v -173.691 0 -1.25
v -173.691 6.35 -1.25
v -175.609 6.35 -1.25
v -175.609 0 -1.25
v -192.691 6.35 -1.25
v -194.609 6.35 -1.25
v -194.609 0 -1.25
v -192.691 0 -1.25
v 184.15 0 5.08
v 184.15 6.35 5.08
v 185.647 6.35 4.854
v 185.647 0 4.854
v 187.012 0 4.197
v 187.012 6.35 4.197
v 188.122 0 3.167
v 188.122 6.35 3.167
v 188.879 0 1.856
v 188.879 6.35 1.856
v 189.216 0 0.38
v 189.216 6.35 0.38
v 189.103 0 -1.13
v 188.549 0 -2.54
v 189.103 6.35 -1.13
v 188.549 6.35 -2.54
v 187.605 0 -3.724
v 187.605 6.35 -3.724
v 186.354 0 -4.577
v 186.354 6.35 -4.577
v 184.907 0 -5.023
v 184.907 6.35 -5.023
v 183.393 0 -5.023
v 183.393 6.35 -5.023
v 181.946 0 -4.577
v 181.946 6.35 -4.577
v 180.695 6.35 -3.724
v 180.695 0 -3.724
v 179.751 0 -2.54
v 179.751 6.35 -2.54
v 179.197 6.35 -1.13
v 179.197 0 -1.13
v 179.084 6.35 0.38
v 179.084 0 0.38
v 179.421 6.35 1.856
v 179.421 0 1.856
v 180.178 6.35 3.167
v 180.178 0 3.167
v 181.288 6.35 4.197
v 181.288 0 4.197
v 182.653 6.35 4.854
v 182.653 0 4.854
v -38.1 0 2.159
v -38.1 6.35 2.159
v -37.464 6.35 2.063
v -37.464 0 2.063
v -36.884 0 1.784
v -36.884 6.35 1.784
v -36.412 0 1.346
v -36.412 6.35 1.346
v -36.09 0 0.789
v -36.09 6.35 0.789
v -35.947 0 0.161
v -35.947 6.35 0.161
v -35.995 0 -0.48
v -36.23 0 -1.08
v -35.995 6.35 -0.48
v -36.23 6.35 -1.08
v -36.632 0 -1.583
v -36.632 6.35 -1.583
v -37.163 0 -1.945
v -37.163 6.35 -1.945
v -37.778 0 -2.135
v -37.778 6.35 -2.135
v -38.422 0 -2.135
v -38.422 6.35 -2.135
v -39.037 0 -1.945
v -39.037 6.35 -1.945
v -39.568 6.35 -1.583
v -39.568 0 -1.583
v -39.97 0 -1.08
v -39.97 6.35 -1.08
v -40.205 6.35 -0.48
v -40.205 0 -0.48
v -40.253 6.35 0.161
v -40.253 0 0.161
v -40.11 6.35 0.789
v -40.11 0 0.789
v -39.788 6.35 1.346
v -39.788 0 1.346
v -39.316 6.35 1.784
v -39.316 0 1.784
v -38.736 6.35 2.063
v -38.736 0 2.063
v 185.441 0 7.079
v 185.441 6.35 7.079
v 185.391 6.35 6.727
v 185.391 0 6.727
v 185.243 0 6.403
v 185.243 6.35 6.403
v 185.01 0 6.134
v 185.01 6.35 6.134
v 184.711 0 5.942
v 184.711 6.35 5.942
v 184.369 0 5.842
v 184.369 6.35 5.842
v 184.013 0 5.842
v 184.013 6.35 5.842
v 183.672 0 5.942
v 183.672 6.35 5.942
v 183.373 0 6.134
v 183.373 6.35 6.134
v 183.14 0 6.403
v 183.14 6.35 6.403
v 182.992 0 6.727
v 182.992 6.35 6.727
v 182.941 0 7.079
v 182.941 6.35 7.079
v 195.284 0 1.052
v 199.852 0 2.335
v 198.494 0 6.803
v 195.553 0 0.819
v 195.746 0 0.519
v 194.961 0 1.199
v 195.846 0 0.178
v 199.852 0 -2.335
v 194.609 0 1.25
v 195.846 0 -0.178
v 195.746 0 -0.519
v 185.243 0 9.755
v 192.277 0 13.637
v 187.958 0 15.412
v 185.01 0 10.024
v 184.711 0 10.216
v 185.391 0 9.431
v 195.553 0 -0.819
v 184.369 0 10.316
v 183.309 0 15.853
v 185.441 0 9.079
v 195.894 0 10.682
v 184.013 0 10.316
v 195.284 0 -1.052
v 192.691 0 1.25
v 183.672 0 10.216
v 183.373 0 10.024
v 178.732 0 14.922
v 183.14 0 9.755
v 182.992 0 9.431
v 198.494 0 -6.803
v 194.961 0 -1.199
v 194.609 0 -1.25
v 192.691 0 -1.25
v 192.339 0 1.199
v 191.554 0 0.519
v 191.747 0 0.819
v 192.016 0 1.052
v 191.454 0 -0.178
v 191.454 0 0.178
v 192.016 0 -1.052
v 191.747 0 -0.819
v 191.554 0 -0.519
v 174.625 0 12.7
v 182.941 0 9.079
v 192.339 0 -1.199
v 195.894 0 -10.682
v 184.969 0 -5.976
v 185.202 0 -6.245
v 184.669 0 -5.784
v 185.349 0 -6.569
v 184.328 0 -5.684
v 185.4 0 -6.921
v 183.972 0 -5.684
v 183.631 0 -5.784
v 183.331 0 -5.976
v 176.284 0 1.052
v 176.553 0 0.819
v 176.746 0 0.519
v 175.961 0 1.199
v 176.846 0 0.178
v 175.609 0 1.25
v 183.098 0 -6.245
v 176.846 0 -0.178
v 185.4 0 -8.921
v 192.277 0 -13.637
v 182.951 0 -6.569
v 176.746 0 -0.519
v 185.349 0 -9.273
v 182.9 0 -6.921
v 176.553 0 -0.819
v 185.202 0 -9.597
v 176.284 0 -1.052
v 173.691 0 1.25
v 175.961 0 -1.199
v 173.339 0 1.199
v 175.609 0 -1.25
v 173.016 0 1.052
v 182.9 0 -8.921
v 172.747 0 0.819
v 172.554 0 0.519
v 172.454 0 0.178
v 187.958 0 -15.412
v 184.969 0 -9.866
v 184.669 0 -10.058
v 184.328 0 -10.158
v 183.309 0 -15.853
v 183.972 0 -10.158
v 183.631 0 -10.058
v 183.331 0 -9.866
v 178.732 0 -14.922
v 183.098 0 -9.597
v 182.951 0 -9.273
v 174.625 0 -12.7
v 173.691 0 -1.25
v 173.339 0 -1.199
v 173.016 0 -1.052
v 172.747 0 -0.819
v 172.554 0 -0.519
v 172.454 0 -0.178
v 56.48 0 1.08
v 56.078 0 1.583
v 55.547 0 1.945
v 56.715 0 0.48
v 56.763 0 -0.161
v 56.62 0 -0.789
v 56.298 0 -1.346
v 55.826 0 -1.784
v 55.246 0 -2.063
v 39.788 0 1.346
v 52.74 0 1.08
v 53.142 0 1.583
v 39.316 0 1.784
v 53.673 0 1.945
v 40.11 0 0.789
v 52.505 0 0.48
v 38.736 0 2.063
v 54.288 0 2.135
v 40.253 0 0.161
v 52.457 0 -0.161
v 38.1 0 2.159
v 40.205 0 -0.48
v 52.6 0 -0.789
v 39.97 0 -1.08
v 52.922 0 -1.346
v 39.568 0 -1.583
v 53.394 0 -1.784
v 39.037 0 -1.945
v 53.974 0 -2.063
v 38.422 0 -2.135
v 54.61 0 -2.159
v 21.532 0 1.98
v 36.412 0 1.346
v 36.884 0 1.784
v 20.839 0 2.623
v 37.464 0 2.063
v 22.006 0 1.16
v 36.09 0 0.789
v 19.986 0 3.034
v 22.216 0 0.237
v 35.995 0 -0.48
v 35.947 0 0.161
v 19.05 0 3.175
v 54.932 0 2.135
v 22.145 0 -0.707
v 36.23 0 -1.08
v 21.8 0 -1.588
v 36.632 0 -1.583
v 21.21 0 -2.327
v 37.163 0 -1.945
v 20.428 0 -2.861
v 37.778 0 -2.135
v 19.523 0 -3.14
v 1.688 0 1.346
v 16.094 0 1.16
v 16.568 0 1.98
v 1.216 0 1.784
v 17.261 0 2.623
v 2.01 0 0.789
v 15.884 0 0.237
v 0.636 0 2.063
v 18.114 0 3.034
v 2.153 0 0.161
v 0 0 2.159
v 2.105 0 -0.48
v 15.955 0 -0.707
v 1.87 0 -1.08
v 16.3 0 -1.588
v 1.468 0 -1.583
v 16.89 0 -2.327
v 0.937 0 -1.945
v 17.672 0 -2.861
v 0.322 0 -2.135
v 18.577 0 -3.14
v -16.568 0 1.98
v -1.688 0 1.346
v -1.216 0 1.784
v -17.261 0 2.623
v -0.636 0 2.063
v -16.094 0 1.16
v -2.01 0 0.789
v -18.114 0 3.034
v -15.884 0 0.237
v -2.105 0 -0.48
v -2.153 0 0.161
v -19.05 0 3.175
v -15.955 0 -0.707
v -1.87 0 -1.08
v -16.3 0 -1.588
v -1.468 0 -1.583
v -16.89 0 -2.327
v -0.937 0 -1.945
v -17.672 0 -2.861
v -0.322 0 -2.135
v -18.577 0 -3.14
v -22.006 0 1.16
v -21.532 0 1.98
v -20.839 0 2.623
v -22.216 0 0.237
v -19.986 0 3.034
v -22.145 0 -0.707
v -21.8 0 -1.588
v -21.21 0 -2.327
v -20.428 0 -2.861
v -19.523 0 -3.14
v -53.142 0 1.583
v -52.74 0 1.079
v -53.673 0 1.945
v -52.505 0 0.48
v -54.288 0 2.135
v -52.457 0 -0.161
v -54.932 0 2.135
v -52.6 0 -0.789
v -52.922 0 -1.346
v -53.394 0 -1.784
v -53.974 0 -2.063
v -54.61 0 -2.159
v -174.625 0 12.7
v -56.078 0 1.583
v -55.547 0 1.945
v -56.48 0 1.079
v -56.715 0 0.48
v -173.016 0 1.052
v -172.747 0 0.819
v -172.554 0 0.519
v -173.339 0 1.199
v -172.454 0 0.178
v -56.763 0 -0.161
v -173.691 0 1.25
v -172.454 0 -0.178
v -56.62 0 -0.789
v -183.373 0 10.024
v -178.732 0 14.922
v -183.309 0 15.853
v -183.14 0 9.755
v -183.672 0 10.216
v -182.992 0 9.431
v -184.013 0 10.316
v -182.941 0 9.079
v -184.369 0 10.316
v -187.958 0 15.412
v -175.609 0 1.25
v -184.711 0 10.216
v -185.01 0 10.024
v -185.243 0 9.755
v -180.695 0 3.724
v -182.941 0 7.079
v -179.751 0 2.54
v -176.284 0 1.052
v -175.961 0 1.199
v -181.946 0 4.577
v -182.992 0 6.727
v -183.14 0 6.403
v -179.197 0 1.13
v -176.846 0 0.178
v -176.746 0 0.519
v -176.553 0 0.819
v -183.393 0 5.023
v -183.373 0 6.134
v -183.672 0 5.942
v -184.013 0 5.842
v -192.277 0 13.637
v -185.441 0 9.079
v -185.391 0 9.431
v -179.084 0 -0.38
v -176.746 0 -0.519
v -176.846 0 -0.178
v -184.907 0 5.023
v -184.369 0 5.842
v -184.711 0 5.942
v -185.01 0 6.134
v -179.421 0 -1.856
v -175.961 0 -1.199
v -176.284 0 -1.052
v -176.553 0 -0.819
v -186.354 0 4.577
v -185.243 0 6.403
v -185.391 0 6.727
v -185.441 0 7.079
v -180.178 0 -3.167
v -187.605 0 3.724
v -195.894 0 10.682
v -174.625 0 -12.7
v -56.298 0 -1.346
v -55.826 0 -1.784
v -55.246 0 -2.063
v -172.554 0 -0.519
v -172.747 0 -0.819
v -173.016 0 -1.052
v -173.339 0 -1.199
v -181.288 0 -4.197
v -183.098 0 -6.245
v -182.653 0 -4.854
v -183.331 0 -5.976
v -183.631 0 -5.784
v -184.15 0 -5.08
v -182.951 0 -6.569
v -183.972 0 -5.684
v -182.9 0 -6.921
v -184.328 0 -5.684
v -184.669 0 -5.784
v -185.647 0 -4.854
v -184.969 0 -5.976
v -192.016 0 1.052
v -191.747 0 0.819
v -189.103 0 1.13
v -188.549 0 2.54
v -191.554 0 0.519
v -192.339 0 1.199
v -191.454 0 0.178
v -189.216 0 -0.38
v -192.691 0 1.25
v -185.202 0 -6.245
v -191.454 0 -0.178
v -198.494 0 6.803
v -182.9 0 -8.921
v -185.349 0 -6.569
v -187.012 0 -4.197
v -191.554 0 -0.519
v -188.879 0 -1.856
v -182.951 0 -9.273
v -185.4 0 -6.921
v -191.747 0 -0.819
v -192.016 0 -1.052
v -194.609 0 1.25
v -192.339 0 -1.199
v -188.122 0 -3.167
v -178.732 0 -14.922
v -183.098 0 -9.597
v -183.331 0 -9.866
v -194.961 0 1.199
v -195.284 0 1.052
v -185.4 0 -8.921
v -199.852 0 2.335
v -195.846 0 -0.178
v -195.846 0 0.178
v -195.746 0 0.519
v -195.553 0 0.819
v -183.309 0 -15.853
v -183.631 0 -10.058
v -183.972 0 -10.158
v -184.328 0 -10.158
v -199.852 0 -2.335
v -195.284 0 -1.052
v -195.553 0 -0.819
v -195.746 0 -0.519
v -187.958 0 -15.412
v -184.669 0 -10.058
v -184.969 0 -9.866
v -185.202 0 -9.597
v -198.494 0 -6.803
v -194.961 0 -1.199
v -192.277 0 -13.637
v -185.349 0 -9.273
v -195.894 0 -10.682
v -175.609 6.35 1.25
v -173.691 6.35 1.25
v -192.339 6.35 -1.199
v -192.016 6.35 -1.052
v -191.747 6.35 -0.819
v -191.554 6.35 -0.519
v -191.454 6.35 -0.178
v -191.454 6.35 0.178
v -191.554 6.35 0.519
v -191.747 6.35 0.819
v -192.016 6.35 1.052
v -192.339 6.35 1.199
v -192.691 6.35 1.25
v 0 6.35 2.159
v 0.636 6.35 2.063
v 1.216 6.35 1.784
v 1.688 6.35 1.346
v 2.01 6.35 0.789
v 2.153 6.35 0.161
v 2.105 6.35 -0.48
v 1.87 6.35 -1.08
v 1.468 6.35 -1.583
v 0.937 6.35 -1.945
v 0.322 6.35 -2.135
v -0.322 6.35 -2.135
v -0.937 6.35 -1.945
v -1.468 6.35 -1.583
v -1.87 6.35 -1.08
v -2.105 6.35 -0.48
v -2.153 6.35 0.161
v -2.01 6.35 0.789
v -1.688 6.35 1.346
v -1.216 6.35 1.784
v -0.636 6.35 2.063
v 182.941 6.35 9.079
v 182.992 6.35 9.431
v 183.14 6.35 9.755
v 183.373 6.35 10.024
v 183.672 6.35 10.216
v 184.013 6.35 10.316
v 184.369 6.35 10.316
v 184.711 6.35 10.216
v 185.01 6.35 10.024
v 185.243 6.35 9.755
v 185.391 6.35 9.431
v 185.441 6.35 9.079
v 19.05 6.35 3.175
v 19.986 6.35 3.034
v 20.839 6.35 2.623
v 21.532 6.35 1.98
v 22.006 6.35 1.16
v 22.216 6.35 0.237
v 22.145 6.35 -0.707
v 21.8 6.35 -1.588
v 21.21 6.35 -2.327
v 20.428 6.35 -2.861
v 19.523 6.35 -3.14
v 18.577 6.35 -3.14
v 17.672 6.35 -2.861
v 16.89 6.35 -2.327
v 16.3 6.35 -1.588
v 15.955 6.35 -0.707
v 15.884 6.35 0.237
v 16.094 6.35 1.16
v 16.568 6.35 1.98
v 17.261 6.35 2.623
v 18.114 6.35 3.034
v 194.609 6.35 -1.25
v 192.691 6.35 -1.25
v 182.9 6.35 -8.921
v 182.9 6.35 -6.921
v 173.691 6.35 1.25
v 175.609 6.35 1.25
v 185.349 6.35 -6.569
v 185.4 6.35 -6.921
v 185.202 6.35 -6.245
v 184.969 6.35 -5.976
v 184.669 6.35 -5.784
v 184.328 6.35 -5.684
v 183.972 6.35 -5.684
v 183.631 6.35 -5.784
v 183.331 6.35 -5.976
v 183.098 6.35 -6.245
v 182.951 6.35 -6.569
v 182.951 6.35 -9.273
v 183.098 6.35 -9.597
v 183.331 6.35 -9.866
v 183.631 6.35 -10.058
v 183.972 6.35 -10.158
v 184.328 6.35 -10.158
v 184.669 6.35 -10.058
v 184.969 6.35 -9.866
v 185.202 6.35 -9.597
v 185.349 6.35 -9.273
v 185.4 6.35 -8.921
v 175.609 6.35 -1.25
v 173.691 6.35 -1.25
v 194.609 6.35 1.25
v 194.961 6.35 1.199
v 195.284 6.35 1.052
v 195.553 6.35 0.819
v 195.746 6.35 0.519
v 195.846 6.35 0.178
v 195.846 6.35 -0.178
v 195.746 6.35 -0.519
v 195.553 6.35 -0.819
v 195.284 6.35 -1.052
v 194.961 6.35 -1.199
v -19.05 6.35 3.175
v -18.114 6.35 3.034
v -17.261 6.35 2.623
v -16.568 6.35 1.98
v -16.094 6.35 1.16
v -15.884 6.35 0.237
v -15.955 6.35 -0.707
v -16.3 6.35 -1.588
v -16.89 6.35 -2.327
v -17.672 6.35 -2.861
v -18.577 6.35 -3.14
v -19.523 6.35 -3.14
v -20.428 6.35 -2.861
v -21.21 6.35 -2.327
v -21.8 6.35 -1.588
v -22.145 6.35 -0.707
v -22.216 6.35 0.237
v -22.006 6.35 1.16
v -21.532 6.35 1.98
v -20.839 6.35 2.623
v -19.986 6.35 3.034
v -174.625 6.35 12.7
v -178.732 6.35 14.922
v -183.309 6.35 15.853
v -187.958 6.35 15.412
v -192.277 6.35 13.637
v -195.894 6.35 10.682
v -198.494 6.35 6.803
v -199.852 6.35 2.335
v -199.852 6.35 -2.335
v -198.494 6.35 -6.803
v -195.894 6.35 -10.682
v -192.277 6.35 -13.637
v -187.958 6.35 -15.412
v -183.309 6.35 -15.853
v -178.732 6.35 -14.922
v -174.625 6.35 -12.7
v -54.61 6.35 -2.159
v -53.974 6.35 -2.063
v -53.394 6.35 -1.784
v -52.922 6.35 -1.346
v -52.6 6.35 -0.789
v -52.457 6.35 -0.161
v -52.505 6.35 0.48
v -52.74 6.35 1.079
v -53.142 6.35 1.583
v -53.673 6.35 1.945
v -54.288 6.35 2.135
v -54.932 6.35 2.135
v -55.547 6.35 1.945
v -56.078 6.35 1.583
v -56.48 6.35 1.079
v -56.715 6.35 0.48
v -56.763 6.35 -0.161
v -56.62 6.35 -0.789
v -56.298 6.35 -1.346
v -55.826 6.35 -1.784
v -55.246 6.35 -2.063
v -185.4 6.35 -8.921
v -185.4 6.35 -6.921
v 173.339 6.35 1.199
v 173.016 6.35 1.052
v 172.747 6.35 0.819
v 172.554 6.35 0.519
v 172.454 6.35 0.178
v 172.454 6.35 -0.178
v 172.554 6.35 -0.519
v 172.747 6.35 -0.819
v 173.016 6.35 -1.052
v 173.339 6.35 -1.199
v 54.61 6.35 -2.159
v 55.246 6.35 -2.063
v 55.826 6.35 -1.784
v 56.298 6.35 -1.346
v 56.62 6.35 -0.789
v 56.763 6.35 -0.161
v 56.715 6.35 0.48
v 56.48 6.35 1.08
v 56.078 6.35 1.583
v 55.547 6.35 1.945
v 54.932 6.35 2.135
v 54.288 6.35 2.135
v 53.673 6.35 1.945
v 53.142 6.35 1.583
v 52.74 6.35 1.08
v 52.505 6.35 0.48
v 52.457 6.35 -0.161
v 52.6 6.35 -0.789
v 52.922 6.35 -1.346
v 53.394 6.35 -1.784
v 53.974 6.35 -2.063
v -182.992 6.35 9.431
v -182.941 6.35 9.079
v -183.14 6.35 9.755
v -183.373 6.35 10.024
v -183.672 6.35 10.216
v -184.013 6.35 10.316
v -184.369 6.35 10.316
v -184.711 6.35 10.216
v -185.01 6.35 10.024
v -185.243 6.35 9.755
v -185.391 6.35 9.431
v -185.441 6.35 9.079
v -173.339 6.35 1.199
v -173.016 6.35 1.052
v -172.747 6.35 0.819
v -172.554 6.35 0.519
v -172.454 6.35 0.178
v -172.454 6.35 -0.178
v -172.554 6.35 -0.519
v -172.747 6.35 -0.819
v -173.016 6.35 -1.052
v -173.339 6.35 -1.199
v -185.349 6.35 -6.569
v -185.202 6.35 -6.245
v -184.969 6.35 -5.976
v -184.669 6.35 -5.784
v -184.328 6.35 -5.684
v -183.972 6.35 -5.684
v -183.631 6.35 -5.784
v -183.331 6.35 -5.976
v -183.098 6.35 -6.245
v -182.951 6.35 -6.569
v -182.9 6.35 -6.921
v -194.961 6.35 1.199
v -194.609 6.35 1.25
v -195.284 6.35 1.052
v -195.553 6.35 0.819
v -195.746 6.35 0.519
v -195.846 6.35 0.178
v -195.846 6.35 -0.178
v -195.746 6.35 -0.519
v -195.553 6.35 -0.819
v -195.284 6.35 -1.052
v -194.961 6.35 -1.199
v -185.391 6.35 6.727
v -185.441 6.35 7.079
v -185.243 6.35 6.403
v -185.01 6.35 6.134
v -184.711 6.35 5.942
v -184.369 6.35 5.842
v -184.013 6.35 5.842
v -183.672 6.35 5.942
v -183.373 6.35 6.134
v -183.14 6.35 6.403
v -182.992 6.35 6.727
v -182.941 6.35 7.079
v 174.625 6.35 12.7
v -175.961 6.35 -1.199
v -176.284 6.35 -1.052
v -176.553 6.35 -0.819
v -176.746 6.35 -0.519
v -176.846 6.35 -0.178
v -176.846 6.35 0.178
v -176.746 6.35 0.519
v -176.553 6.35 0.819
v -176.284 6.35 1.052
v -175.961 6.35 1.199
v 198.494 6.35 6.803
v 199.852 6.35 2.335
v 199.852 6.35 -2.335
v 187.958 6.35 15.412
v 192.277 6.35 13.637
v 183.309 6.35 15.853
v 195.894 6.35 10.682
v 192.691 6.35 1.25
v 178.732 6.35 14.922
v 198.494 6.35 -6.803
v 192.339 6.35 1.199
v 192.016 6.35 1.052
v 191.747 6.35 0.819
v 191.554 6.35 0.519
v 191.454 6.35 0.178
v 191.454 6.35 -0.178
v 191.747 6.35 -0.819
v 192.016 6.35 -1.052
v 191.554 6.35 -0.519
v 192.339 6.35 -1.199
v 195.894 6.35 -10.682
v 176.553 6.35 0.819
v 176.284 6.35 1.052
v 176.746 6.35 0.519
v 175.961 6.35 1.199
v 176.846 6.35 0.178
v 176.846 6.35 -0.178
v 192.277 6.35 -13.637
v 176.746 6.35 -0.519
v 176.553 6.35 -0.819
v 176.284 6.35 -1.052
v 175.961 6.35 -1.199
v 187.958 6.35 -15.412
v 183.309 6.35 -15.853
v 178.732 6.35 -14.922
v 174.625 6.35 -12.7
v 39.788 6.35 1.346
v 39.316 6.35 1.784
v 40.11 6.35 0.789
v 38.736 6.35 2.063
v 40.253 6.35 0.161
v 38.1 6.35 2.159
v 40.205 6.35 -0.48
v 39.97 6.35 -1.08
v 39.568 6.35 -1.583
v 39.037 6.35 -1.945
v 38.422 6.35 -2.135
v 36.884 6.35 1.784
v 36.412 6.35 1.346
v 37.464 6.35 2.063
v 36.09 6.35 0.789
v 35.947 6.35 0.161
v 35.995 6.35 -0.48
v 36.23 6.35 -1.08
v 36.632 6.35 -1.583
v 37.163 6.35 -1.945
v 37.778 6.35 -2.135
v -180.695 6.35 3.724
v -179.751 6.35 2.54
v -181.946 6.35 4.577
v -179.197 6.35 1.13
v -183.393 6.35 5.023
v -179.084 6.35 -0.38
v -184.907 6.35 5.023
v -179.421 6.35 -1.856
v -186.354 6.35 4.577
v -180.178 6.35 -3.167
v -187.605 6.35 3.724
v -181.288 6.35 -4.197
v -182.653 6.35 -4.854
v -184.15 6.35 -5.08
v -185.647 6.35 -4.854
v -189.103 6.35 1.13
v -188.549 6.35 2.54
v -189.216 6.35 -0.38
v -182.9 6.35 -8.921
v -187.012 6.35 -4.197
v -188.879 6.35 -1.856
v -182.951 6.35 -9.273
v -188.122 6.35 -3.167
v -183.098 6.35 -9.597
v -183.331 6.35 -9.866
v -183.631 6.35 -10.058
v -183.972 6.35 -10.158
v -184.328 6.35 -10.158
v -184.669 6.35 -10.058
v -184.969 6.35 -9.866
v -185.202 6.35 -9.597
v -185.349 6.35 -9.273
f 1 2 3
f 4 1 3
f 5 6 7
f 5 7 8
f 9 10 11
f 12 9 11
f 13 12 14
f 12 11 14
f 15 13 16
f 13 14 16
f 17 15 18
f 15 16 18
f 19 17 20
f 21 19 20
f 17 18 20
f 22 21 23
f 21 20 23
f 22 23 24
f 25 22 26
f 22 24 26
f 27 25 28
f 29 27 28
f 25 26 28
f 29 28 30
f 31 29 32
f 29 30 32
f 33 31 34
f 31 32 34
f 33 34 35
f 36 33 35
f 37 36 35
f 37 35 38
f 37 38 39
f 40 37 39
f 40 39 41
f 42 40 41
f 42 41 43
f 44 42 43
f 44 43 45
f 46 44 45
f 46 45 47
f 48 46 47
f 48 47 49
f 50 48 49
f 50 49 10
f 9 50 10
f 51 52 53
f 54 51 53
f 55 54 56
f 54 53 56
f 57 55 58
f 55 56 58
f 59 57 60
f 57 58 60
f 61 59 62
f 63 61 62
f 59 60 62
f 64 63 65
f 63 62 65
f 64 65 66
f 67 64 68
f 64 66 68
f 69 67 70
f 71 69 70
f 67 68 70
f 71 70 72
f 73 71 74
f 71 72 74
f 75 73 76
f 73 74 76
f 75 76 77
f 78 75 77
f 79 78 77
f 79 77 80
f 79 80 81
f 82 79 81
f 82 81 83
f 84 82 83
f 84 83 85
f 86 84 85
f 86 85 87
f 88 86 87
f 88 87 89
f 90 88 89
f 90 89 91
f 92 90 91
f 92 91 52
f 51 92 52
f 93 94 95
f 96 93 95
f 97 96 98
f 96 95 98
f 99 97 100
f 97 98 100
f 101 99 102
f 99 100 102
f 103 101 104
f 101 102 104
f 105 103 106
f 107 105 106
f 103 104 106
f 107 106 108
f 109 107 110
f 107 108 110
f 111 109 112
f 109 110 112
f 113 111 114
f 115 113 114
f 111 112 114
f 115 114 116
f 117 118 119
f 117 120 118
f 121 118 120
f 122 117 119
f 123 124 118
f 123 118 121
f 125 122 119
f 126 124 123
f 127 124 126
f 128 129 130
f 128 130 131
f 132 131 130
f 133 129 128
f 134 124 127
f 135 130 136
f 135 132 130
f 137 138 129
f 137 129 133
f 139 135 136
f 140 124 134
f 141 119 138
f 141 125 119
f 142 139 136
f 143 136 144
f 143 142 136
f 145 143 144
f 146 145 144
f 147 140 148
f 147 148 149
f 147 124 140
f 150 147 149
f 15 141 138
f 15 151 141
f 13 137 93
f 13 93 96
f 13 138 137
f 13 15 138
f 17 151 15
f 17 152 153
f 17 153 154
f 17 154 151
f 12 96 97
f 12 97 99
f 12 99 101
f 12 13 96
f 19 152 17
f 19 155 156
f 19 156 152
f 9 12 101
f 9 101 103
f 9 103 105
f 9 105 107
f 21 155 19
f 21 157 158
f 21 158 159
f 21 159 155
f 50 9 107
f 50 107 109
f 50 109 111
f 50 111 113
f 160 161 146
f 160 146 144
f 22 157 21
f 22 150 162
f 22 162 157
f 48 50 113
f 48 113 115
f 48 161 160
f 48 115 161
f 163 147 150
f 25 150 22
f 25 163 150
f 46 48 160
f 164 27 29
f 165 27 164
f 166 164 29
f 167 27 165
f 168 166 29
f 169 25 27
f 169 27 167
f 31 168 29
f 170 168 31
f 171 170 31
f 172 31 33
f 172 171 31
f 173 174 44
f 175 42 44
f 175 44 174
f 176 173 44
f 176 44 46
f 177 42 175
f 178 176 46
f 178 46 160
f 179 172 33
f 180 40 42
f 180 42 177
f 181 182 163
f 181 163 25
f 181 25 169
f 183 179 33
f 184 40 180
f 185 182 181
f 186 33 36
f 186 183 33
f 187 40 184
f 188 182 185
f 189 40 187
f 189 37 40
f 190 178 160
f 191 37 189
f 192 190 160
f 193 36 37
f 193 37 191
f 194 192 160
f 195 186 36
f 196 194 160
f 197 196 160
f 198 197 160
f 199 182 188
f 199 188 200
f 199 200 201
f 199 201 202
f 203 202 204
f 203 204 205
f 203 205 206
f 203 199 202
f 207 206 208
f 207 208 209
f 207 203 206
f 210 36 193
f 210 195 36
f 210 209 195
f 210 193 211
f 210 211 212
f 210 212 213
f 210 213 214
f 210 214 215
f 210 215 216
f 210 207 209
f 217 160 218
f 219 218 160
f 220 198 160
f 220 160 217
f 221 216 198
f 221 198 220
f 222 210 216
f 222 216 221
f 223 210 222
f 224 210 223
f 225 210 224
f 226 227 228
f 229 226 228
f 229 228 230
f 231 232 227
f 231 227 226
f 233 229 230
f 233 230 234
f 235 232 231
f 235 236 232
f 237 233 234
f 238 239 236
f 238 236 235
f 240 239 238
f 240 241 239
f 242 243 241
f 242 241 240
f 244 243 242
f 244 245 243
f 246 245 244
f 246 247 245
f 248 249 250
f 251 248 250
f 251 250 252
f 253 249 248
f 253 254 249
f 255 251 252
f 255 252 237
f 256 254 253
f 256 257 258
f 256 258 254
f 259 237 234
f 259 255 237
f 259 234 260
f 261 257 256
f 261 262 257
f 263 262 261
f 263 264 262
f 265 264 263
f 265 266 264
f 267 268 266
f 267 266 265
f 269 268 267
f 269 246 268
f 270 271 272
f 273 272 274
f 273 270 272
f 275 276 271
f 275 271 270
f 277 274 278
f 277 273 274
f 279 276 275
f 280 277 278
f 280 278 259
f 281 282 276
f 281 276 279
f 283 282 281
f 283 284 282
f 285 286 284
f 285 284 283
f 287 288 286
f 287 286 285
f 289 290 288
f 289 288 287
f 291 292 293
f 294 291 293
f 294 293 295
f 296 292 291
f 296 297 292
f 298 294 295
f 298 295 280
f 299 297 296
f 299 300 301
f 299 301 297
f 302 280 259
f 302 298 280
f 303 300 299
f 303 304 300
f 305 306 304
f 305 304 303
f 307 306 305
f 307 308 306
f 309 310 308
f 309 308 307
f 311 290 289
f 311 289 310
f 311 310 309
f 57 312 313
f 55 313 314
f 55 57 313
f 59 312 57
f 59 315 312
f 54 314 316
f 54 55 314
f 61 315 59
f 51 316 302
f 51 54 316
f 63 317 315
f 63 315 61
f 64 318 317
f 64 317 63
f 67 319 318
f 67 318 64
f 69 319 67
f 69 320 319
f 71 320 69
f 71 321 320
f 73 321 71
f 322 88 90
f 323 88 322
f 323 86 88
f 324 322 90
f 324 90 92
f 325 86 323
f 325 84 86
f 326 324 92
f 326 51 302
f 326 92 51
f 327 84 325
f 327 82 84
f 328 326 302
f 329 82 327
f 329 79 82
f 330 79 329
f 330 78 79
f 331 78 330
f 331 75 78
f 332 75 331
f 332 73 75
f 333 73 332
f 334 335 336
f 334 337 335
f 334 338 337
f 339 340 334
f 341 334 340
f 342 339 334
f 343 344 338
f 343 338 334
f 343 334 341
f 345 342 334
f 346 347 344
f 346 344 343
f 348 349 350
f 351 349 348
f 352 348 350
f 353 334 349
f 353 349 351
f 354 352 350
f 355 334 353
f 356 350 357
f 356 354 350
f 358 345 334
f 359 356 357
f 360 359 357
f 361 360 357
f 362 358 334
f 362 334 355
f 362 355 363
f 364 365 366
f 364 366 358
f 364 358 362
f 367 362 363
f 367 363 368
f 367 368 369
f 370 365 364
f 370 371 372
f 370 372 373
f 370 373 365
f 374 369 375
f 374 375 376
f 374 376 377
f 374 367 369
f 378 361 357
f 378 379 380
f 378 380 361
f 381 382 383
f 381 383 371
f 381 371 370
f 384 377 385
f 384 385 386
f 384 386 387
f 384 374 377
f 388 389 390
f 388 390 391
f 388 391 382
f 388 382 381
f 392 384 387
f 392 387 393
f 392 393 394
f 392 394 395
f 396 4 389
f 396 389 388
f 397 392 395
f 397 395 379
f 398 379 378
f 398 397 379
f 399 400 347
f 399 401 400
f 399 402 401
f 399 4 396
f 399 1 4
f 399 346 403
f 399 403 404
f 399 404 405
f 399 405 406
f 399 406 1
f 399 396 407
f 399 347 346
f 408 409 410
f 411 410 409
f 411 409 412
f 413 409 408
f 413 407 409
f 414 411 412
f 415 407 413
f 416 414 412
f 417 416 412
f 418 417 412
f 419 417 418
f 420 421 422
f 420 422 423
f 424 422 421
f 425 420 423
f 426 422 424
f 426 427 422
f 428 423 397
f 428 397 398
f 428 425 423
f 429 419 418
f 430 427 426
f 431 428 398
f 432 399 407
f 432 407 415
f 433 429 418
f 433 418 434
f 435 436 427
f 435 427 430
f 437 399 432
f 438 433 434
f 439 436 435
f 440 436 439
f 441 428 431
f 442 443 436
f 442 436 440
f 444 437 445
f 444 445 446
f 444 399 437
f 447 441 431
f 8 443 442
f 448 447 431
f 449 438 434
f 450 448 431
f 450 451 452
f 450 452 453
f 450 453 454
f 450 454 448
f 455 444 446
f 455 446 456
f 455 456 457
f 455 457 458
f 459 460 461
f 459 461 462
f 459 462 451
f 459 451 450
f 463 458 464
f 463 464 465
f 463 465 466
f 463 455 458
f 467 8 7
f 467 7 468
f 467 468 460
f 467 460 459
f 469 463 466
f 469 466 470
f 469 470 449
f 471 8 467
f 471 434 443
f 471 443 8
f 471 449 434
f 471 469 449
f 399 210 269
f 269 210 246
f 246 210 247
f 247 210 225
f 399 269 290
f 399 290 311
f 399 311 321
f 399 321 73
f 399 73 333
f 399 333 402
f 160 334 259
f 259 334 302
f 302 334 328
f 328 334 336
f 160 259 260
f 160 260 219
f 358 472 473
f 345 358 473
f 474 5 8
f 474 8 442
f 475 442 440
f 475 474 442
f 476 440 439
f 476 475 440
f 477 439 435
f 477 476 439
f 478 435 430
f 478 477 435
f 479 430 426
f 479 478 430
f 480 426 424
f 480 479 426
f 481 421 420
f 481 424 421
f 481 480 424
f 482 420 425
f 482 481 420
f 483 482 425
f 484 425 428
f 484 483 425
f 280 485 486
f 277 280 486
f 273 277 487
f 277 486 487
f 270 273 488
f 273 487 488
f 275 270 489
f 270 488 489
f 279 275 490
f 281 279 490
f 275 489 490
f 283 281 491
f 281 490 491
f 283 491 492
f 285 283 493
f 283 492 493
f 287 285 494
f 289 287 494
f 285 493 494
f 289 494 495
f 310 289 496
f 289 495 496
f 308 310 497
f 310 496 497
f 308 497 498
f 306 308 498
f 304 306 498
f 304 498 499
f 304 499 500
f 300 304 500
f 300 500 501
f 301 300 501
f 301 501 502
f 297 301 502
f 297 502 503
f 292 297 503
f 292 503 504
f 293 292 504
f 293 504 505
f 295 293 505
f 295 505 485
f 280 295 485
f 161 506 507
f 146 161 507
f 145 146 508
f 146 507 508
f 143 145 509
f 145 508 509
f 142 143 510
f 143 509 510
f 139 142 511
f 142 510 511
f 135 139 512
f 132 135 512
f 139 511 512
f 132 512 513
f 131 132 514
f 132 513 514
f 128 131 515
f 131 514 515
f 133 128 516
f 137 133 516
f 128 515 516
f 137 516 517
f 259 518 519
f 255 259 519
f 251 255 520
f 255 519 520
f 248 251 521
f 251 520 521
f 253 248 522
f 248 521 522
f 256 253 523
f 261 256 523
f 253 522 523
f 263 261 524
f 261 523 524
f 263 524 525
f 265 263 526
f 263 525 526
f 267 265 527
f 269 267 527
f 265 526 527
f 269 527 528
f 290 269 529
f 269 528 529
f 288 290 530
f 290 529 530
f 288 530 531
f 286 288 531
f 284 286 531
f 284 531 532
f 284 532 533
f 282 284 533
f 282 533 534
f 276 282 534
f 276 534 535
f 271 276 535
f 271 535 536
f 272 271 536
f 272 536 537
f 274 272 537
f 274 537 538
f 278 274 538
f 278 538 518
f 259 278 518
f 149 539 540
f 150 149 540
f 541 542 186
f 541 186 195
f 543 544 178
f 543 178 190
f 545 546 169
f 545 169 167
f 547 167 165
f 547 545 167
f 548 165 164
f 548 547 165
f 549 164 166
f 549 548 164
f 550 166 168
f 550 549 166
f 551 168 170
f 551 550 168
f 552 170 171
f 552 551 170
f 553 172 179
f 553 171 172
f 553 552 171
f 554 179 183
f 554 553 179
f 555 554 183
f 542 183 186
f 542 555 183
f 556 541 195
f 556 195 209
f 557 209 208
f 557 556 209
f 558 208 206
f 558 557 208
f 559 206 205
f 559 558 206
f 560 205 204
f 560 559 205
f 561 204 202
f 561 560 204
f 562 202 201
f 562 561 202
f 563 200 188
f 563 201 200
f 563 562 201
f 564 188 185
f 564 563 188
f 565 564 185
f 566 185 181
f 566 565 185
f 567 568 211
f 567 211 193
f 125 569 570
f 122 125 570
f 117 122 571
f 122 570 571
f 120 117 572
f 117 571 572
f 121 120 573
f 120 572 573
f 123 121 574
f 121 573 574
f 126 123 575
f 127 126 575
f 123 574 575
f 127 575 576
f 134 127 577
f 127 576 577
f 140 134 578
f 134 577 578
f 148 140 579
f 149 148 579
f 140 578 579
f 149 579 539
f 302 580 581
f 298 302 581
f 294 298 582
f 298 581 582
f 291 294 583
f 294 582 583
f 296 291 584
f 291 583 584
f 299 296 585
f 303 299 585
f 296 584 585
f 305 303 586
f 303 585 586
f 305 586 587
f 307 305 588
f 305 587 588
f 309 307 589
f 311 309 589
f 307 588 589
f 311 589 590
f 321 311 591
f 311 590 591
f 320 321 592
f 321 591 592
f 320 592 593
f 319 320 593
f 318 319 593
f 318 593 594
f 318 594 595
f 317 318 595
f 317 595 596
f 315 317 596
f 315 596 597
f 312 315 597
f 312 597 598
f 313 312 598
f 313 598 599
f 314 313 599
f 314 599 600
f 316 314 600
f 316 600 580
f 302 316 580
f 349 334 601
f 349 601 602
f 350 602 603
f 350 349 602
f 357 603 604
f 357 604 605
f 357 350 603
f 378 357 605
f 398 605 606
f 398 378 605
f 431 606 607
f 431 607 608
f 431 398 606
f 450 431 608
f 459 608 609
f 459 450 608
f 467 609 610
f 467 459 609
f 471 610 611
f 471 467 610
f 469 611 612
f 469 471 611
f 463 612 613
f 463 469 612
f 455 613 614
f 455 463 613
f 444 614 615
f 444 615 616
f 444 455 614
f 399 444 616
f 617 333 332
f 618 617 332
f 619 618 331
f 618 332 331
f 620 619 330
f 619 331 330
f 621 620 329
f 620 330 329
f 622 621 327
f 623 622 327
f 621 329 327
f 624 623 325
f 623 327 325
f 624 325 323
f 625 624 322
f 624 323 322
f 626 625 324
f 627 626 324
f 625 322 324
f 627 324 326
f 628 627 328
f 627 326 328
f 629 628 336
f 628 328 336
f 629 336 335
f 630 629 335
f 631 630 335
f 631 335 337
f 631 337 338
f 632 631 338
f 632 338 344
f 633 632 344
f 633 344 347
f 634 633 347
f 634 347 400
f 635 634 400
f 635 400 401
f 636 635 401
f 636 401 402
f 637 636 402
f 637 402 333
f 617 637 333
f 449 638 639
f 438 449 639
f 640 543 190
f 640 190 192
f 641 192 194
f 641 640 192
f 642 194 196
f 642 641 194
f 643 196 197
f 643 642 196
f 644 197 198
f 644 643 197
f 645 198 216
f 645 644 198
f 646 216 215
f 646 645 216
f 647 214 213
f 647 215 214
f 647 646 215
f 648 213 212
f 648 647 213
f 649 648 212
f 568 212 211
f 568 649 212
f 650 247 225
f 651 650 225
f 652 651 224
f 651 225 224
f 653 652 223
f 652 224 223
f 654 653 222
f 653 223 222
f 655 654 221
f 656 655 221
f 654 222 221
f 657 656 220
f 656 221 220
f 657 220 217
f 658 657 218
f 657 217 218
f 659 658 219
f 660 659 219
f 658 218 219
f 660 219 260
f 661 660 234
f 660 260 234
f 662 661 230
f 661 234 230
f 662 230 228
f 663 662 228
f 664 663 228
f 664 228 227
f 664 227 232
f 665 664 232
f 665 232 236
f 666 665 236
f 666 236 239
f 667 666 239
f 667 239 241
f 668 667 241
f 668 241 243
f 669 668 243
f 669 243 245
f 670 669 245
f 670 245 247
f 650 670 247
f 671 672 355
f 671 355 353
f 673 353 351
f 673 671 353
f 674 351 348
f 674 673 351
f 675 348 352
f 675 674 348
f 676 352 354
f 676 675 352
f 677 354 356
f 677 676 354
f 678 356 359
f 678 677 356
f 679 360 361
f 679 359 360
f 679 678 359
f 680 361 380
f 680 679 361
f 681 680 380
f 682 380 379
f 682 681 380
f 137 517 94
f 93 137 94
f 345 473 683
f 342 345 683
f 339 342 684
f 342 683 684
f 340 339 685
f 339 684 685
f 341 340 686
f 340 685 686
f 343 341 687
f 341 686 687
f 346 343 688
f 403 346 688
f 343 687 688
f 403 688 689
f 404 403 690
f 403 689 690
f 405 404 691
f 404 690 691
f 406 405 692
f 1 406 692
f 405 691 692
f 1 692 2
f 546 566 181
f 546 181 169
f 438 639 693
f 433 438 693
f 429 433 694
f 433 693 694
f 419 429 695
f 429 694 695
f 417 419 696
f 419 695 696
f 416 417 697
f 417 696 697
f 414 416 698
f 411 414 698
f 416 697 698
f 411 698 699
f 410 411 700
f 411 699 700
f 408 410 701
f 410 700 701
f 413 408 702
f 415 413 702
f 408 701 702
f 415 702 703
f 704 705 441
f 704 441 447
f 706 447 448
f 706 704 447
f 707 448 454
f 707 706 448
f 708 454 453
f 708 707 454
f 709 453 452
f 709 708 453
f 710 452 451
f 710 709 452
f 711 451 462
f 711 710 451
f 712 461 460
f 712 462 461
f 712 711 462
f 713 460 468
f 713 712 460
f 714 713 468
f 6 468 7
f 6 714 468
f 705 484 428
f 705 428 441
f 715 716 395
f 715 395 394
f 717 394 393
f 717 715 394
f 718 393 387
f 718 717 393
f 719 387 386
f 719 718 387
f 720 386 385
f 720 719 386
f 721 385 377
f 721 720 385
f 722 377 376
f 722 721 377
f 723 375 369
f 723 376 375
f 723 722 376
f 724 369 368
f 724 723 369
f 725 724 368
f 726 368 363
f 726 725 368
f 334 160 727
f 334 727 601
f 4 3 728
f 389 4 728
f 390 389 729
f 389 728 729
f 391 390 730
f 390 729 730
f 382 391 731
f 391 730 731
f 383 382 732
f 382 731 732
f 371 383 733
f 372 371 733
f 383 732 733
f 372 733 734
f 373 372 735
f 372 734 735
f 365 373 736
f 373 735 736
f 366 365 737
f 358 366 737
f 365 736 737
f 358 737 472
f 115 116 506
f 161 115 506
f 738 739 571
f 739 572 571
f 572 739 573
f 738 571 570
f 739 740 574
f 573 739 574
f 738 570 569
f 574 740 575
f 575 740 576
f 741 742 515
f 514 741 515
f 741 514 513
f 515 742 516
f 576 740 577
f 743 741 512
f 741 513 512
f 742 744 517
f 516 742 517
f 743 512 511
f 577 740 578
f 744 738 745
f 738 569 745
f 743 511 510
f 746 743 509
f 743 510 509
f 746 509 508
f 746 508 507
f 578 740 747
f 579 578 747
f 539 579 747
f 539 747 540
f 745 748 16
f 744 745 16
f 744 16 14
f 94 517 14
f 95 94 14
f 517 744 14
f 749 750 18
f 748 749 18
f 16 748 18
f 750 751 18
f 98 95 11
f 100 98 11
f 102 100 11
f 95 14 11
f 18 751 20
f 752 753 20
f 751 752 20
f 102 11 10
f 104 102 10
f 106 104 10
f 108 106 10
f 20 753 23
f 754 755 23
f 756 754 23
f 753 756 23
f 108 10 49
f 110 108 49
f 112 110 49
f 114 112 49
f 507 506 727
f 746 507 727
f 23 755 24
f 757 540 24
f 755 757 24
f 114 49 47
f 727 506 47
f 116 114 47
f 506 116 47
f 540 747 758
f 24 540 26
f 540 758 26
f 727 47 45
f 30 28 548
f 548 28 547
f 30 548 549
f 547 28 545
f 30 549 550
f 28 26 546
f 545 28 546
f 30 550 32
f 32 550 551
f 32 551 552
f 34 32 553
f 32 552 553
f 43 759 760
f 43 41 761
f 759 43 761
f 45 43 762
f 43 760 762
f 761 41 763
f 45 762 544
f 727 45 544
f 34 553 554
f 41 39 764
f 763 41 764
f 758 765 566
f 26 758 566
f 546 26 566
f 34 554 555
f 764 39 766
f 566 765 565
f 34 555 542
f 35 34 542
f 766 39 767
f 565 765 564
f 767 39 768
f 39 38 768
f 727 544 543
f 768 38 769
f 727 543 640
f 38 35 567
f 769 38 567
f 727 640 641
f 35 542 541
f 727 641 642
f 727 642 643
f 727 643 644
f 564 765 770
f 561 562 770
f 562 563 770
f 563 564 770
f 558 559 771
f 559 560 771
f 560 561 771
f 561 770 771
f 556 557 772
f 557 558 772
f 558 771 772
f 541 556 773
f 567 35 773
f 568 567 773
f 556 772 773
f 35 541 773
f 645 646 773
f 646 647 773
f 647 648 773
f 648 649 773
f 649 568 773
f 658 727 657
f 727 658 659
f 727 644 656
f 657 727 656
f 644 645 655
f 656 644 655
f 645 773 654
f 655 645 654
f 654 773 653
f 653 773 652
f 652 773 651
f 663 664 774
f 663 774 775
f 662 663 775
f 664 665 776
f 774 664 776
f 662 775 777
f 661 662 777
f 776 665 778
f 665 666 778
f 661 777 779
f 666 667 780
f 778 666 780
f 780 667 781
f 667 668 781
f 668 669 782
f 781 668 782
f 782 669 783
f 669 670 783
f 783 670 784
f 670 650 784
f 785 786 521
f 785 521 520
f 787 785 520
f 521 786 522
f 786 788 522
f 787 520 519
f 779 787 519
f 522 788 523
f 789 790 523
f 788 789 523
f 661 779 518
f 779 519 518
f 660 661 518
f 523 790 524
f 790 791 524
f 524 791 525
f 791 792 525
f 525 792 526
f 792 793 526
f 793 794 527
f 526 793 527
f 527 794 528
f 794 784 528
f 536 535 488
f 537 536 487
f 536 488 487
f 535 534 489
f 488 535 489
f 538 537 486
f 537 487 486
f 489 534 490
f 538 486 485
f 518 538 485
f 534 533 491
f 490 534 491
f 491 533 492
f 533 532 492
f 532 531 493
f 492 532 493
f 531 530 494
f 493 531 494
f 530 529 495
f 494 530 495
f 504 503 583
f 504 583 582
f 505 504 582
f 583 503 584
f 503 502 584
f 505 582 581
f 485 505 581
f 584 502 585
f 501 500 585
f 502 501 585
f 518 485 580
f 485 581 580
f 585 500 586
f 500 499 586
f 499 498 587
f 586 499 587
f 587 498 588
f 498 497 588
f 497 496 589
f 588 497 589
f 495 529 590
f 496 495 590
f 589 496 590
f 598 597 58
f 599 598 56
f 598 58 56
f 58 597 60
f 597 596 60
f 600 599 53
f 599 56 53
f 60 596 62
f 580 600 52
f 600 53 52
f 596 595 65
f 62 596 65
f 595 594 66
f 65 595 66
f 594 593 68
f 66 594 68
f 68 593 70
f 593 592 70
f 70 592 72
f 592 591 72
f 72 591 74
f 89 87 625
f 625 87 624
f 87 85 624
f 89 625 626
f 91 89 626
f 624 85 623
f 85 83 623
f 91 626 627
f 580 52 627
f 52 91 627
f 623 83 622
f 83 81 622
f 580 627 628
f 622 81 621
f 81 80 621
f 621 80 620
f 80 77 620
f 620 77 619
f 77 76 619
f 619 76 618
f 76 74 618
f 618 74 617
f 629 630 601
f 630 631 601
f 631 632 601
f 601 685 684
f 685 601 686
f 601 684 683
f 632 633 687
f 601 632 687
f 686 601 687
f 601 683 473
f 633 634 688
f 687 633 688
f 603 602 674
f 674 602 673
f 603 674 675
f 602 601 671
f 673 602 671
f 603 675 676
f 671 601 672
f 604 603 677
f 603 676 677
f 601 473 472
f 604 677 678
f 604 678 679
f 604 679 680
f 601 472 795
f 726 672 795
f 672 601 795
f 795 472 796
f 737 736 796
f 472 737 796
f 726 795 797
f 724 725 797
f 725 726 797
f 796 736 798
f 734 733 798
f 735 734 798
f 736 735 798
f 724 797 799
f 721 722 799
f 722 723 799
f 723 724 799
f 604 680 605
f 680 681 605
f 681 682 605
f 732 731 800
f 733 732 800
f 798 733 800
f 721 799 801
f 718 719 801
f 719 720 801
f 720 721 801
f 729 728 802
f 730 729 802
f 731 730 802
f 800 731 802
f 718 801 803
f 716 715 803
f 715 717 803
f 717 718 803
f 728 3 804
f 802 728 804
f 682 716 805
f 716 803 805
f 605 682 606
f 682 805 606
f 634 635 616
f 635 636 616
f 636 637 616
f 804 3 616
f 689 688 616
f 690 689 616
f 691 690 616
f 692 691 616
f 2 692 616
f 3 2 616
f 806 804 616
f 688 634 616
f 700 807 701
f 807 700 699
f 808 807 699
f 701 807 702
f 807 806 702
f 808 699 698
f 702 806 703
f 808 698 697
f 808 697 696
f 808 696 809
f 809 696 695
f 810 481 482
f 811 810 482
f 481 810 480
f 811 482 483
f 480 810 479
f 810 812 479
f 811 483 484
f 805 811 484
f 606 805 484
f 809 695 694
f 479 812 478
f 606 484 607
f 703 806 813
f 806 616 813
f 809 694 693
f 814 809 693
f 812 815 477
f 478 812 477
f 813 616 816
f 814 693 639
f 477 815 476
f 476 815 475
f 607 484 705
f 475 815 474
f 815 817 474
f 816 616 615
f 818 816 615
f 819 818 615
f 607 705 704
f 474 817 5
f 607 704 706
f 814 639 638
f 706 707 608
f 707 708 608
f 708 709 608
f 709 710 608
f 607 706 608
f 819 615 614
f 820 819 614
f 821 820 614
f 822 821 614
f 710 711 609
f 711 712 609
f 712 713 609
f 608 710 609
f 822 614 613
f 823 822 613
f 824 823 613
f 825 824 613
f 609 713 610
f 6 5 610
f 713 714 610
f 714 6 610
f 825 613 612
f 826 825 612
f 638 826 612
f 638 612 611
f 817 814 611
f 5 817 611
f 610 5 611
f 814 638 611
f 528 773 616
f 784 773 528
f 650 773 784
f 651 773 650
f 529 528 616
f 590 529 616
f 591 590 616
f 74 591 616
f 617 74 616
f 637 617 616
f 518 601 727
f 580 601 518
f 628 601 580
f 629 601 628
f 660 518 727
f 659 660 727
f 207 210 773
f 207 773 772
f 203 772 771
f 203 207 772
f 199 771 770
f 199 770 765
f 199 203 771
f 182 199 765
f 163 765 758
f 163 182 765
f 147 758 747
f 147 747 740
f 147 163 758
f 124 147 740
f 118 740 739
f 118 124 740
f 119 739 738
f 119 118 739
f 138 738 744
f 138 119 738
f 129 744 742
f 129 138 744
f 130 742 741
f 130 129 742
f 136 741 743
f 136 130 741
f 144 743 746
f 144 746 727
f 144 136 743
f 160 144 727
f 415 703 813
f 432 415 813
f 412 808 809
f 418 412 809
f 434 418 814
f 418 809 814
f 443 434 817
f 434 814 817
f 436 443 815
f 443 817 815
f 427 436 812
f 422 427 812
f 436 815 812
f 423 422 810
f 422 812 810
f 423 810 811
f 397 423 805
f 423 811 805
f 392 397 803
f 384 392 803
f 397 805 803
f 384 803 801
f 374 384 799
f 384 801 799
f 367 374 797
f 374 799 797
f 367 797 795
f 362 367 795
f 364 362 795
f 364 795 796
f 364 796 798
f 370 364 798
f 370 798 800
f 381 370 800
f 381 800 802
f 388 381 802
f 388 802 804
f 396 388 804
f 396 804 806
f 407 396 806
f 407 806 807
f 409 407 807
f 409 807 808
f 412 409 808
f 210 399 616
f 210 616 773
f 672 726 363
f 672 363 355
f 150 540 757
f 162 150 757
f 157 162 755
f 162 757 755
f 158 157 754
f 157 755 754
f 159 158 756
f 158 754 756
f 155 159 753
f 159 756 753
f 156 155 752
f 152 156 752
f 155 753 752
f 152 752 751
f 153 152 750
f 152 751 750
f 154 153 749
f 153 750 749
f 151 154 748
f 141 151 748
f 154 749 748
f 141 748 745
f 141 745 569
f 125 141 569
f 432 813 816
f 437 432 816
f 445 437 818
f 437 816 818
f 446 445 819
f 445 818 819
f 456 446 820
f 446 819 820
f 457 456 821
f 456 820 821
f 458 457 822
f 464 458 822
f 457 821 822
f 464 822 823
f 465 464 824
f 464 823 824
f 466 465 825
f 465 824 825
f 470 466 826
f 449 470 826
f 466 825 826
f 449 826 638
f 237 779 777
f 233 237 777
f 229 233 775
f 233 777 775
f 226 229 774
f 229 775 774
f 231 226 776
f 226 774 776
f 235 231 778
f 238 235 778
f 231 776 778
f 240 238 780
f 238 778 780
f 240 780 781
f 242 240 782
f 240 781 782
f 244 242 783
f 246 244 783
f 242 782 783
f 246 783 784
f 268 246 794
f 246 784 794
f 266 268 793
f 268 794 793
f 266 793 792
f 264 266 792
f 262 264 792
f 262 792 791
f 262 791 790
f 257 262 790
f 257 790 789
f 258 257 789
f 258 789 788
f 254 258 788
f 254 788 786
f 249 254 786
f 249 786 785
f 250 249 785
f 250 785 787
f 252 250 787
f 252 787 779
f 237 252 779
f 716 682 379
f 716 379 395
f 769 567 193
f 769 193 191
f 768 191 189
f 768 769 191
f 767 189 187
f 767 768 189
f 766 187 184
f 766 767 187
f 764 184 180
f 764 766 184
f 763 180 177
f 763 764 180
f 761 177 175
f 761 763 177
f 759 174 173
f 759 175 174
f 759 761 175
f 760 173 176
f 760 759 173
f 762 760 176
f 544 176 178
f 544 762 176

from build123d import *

# Parameters (mm, degrees)
BOSS_EXTRUDE1_DEPTH = 6.35
SKETCH2_R           = 5.08
CUT_EXTRUDE1_DEPTH  = 201.754423986
SKETCH3_R           = 2.159
CUT_EXTRUDE2_DEPTH  = 201.754423986
SKETCH4_R           = 3.175
CUT_EXTRUDE3_DEPTH  = 201.754423986
SKETCH6_R           = 2.159
CUT_EXTRUDE5_DEPTH  = 201.754423986


with BuildPart() as part:
    # Sketch1 → Boss-Extrude1 (new body)
    with BuildSketch(Plane(origin=(0, 0, 0), x_dir=(1, 0, 0), z_dir=(0, 1, 0))):
        with BuildLine():
            Line((-174.625, 12.7), (174.625, 12.7))
            ThreePointArc((174.625, 12.7), (200.025, 0), (174.625, -12.7))
            Line((174.625, -12.7), (-174.625, -12.7))
            ThreePointArc((-174.625, -12.7), (-200.025, 0), (-174.625, 12.7))
        make_face()
    extrude(amount=BOSS_EXTRUDE1_DEPTH)

    # Sketch2 → Cut-Extrude1 (cut, through all)
    with BuildSketch(Plane(origin=(0, 6.35, 0), x_dir=(1, 0, 0), z_dir=(0, 1, 0))):
        with Locations(Location((184.15, 0, 0), (0, 0, 270))):
            Circle(SKETCH2_R)
        with Locations(Location((-184.15, 0, 0), (0, 0, 90))):
            Circle(SKETCH2_R)
        with BuildLine():
            Line((173.691383345, 1.25), (175.608616655, 1.25))
            ThreePointArc((175.608616655, 1.25), (176.858616655, 0), (175.608616655, -1.25))
            Line((175.608616655, -1.25), (173.691383345, -1.25))
            ThreePointArc((173.691383345, -1.25), (172.441383345, 0), (173.691383345, 1.25))
        make_face()
        with BuildLine():
            Line((194.608616655, 1.25), (192.691383345, 1.25))
            ThreePointArc((192.691383345, 1.25), (191.441383345, 0), (192.691383345, -1.25))
            Line((192.691383345, -1.25), (194.608616655, -1.25))
            ThreePointArc((194.608616655, -1.25), (195.858616655, 0), (194.608616655, 1.25))
        make_face()
        with BuildLine():
            Line((185.4, 8.920928665), (185.4, 6.921035691))
            ThreePointArc((185.4, 6.921035691), (184.15, 5.671035691), (182.9, 6.921035691))
            Line((182.9, 6.921035691), (182.9, 8.920928665))
            ThreePointArc((182.9, 8.920928665), (184.15, 10.170928665), (185.4, 8.920928665))
        make_face()
        with BuildLine():
            Line((185.441381345, -9.078964309), (185.441381345, -7.078964309))
            ThreePointArc((185.441381345, -7.078964309), (184.191381345, -5.828964309), (182.941381345, -7.078964309))
            Line((182.941381345, -7.078964309), (182.941381345, -9.078964309))
            ThreePointArc((182.941381345, -9.078964309), (184.191381345, -10.328964309), (185.441381345, -9.078964309))
        make_face()
        with BuildLine():
            Line((-185.441381345, -9.078964309), (-185.441381345, -7.078964309))
            ThreePointArc((-185.441381345, -7.078964309), (-184.191381345, -5.828964309), (-182.941381345, -7.078964309))
            Line((-182.941381345, -7.078964309), (-182.941381345, -9.078964309))
            ThreePointArc((-182.941381345, -9.078964309), (-184.191381345, -10.328964309), (-185.441381345, -9.078964309))
        make_face()
        with BuildLine():
            Line((-185.4, 8.920928665), (-185.4, 6.921035691))
            ThreePointArc((-185.4, 6.921035691), (-184.15, 5.671035691), (-182.9, 6.921035691))
            Line((-182.9, 6.921035691), (-182.9, 8.920928665))
            ThreePointArc((-182.9, 8.920928665), (-184.15, 10.170928665), (-185.4, 8.920928665))
        make_face()
        with BuildLine():
            Line((-194.608616655, 1.25), (-192.691383345, 1.25))
            ThreePointArc((-192.691383345, 1.25), (-191.441383345, 0), (-192.691383345, -1.25))
            Line((-192.691383345, -1.25), (-194.608616655, -1.25))
            ThreePointArc((-194.608616655, -1.25), (-195.858616655, 0), (-194.608616655, 1.25))
        make_face()
        with BuildLine():
            Line((-173.691383345, 1.25), (-175.608616655, 1.25))
            ThreePointArc((-175.608616655, 1.25), (-176.858616655, 0), (-175.608616655, -1.25))
            Line((-175.608616655, -1.25), (-173.691383345, -1.25))
            ThreePointArc((-173.691383345, -1.25), (-172.441383345, 0), (-173.691383345, 1.25))
        make_face()
    extrude(amount=-CUT_EXTRUDE1_DEPTH, mode=Mode.SUBTRACT)

    # Sketch3 → Cut-Extrude2 (cut, through all)
    with BuildSketch(Plane(origin=(0, 6.35, 0), x_dir=(1, 0, 0), z_dir=(0, 1, 0))):
        with Locations(Location((0, 0, 0), (0, 0, 270))):
            Circle(SKETCH3_R)
        with Locations(Location((38.1, 0, 0), (0, 0, 270))):
            Circle(SKETCH3_R)
        with Locations(Location((-38.1, 0, 0), (0, 0, 270))):
            Circle(SKETCH3_R)
    extrude(amount=-CUT_EXTRUDE2_DEPTH, mode=Mode.SUBTRACT)

    # Sketch4 → Cut-Extrude3 (cut, through all)
    with BuildSketch(Plane(origin=(0, 6.35, 0), x_dir=(1, 0, 0), z_dir=(0, 1, 0))):
        with Locations(Location((-19.05, 0, 0), (0, 0, 270))):
            Circle(SKETCH4_R)
        with Locations(Location((19.05, 0, 0), (0, 0, 270))):
            Circle(SKETCH4_R)
    extrude(amount=-CUT_EXTRUDE3_DEPTH, mode=Mode.SUBTRACT)

    # Sketch6 → Cut-Extrude5 (cut, through all)
    with BuildSketch(Plane(origin=(0, 0, 0), x_dir=(-1, 0, 0), z_dir=(0, -1, 0))):
        with Locations(Location((54.61, 1.2e-08, 0), (0, 0, 90))):
            Circle(SKETCH6_R)
        with Locations(Location((-54.61, 0, 0), (0, 0, 90))):
            Circle(SKETCH6_R)
    extrude(amount=-CUT_EXTRUDE5_DEPTH, mode=Mode.SUBTRACT)


solid = part.part
